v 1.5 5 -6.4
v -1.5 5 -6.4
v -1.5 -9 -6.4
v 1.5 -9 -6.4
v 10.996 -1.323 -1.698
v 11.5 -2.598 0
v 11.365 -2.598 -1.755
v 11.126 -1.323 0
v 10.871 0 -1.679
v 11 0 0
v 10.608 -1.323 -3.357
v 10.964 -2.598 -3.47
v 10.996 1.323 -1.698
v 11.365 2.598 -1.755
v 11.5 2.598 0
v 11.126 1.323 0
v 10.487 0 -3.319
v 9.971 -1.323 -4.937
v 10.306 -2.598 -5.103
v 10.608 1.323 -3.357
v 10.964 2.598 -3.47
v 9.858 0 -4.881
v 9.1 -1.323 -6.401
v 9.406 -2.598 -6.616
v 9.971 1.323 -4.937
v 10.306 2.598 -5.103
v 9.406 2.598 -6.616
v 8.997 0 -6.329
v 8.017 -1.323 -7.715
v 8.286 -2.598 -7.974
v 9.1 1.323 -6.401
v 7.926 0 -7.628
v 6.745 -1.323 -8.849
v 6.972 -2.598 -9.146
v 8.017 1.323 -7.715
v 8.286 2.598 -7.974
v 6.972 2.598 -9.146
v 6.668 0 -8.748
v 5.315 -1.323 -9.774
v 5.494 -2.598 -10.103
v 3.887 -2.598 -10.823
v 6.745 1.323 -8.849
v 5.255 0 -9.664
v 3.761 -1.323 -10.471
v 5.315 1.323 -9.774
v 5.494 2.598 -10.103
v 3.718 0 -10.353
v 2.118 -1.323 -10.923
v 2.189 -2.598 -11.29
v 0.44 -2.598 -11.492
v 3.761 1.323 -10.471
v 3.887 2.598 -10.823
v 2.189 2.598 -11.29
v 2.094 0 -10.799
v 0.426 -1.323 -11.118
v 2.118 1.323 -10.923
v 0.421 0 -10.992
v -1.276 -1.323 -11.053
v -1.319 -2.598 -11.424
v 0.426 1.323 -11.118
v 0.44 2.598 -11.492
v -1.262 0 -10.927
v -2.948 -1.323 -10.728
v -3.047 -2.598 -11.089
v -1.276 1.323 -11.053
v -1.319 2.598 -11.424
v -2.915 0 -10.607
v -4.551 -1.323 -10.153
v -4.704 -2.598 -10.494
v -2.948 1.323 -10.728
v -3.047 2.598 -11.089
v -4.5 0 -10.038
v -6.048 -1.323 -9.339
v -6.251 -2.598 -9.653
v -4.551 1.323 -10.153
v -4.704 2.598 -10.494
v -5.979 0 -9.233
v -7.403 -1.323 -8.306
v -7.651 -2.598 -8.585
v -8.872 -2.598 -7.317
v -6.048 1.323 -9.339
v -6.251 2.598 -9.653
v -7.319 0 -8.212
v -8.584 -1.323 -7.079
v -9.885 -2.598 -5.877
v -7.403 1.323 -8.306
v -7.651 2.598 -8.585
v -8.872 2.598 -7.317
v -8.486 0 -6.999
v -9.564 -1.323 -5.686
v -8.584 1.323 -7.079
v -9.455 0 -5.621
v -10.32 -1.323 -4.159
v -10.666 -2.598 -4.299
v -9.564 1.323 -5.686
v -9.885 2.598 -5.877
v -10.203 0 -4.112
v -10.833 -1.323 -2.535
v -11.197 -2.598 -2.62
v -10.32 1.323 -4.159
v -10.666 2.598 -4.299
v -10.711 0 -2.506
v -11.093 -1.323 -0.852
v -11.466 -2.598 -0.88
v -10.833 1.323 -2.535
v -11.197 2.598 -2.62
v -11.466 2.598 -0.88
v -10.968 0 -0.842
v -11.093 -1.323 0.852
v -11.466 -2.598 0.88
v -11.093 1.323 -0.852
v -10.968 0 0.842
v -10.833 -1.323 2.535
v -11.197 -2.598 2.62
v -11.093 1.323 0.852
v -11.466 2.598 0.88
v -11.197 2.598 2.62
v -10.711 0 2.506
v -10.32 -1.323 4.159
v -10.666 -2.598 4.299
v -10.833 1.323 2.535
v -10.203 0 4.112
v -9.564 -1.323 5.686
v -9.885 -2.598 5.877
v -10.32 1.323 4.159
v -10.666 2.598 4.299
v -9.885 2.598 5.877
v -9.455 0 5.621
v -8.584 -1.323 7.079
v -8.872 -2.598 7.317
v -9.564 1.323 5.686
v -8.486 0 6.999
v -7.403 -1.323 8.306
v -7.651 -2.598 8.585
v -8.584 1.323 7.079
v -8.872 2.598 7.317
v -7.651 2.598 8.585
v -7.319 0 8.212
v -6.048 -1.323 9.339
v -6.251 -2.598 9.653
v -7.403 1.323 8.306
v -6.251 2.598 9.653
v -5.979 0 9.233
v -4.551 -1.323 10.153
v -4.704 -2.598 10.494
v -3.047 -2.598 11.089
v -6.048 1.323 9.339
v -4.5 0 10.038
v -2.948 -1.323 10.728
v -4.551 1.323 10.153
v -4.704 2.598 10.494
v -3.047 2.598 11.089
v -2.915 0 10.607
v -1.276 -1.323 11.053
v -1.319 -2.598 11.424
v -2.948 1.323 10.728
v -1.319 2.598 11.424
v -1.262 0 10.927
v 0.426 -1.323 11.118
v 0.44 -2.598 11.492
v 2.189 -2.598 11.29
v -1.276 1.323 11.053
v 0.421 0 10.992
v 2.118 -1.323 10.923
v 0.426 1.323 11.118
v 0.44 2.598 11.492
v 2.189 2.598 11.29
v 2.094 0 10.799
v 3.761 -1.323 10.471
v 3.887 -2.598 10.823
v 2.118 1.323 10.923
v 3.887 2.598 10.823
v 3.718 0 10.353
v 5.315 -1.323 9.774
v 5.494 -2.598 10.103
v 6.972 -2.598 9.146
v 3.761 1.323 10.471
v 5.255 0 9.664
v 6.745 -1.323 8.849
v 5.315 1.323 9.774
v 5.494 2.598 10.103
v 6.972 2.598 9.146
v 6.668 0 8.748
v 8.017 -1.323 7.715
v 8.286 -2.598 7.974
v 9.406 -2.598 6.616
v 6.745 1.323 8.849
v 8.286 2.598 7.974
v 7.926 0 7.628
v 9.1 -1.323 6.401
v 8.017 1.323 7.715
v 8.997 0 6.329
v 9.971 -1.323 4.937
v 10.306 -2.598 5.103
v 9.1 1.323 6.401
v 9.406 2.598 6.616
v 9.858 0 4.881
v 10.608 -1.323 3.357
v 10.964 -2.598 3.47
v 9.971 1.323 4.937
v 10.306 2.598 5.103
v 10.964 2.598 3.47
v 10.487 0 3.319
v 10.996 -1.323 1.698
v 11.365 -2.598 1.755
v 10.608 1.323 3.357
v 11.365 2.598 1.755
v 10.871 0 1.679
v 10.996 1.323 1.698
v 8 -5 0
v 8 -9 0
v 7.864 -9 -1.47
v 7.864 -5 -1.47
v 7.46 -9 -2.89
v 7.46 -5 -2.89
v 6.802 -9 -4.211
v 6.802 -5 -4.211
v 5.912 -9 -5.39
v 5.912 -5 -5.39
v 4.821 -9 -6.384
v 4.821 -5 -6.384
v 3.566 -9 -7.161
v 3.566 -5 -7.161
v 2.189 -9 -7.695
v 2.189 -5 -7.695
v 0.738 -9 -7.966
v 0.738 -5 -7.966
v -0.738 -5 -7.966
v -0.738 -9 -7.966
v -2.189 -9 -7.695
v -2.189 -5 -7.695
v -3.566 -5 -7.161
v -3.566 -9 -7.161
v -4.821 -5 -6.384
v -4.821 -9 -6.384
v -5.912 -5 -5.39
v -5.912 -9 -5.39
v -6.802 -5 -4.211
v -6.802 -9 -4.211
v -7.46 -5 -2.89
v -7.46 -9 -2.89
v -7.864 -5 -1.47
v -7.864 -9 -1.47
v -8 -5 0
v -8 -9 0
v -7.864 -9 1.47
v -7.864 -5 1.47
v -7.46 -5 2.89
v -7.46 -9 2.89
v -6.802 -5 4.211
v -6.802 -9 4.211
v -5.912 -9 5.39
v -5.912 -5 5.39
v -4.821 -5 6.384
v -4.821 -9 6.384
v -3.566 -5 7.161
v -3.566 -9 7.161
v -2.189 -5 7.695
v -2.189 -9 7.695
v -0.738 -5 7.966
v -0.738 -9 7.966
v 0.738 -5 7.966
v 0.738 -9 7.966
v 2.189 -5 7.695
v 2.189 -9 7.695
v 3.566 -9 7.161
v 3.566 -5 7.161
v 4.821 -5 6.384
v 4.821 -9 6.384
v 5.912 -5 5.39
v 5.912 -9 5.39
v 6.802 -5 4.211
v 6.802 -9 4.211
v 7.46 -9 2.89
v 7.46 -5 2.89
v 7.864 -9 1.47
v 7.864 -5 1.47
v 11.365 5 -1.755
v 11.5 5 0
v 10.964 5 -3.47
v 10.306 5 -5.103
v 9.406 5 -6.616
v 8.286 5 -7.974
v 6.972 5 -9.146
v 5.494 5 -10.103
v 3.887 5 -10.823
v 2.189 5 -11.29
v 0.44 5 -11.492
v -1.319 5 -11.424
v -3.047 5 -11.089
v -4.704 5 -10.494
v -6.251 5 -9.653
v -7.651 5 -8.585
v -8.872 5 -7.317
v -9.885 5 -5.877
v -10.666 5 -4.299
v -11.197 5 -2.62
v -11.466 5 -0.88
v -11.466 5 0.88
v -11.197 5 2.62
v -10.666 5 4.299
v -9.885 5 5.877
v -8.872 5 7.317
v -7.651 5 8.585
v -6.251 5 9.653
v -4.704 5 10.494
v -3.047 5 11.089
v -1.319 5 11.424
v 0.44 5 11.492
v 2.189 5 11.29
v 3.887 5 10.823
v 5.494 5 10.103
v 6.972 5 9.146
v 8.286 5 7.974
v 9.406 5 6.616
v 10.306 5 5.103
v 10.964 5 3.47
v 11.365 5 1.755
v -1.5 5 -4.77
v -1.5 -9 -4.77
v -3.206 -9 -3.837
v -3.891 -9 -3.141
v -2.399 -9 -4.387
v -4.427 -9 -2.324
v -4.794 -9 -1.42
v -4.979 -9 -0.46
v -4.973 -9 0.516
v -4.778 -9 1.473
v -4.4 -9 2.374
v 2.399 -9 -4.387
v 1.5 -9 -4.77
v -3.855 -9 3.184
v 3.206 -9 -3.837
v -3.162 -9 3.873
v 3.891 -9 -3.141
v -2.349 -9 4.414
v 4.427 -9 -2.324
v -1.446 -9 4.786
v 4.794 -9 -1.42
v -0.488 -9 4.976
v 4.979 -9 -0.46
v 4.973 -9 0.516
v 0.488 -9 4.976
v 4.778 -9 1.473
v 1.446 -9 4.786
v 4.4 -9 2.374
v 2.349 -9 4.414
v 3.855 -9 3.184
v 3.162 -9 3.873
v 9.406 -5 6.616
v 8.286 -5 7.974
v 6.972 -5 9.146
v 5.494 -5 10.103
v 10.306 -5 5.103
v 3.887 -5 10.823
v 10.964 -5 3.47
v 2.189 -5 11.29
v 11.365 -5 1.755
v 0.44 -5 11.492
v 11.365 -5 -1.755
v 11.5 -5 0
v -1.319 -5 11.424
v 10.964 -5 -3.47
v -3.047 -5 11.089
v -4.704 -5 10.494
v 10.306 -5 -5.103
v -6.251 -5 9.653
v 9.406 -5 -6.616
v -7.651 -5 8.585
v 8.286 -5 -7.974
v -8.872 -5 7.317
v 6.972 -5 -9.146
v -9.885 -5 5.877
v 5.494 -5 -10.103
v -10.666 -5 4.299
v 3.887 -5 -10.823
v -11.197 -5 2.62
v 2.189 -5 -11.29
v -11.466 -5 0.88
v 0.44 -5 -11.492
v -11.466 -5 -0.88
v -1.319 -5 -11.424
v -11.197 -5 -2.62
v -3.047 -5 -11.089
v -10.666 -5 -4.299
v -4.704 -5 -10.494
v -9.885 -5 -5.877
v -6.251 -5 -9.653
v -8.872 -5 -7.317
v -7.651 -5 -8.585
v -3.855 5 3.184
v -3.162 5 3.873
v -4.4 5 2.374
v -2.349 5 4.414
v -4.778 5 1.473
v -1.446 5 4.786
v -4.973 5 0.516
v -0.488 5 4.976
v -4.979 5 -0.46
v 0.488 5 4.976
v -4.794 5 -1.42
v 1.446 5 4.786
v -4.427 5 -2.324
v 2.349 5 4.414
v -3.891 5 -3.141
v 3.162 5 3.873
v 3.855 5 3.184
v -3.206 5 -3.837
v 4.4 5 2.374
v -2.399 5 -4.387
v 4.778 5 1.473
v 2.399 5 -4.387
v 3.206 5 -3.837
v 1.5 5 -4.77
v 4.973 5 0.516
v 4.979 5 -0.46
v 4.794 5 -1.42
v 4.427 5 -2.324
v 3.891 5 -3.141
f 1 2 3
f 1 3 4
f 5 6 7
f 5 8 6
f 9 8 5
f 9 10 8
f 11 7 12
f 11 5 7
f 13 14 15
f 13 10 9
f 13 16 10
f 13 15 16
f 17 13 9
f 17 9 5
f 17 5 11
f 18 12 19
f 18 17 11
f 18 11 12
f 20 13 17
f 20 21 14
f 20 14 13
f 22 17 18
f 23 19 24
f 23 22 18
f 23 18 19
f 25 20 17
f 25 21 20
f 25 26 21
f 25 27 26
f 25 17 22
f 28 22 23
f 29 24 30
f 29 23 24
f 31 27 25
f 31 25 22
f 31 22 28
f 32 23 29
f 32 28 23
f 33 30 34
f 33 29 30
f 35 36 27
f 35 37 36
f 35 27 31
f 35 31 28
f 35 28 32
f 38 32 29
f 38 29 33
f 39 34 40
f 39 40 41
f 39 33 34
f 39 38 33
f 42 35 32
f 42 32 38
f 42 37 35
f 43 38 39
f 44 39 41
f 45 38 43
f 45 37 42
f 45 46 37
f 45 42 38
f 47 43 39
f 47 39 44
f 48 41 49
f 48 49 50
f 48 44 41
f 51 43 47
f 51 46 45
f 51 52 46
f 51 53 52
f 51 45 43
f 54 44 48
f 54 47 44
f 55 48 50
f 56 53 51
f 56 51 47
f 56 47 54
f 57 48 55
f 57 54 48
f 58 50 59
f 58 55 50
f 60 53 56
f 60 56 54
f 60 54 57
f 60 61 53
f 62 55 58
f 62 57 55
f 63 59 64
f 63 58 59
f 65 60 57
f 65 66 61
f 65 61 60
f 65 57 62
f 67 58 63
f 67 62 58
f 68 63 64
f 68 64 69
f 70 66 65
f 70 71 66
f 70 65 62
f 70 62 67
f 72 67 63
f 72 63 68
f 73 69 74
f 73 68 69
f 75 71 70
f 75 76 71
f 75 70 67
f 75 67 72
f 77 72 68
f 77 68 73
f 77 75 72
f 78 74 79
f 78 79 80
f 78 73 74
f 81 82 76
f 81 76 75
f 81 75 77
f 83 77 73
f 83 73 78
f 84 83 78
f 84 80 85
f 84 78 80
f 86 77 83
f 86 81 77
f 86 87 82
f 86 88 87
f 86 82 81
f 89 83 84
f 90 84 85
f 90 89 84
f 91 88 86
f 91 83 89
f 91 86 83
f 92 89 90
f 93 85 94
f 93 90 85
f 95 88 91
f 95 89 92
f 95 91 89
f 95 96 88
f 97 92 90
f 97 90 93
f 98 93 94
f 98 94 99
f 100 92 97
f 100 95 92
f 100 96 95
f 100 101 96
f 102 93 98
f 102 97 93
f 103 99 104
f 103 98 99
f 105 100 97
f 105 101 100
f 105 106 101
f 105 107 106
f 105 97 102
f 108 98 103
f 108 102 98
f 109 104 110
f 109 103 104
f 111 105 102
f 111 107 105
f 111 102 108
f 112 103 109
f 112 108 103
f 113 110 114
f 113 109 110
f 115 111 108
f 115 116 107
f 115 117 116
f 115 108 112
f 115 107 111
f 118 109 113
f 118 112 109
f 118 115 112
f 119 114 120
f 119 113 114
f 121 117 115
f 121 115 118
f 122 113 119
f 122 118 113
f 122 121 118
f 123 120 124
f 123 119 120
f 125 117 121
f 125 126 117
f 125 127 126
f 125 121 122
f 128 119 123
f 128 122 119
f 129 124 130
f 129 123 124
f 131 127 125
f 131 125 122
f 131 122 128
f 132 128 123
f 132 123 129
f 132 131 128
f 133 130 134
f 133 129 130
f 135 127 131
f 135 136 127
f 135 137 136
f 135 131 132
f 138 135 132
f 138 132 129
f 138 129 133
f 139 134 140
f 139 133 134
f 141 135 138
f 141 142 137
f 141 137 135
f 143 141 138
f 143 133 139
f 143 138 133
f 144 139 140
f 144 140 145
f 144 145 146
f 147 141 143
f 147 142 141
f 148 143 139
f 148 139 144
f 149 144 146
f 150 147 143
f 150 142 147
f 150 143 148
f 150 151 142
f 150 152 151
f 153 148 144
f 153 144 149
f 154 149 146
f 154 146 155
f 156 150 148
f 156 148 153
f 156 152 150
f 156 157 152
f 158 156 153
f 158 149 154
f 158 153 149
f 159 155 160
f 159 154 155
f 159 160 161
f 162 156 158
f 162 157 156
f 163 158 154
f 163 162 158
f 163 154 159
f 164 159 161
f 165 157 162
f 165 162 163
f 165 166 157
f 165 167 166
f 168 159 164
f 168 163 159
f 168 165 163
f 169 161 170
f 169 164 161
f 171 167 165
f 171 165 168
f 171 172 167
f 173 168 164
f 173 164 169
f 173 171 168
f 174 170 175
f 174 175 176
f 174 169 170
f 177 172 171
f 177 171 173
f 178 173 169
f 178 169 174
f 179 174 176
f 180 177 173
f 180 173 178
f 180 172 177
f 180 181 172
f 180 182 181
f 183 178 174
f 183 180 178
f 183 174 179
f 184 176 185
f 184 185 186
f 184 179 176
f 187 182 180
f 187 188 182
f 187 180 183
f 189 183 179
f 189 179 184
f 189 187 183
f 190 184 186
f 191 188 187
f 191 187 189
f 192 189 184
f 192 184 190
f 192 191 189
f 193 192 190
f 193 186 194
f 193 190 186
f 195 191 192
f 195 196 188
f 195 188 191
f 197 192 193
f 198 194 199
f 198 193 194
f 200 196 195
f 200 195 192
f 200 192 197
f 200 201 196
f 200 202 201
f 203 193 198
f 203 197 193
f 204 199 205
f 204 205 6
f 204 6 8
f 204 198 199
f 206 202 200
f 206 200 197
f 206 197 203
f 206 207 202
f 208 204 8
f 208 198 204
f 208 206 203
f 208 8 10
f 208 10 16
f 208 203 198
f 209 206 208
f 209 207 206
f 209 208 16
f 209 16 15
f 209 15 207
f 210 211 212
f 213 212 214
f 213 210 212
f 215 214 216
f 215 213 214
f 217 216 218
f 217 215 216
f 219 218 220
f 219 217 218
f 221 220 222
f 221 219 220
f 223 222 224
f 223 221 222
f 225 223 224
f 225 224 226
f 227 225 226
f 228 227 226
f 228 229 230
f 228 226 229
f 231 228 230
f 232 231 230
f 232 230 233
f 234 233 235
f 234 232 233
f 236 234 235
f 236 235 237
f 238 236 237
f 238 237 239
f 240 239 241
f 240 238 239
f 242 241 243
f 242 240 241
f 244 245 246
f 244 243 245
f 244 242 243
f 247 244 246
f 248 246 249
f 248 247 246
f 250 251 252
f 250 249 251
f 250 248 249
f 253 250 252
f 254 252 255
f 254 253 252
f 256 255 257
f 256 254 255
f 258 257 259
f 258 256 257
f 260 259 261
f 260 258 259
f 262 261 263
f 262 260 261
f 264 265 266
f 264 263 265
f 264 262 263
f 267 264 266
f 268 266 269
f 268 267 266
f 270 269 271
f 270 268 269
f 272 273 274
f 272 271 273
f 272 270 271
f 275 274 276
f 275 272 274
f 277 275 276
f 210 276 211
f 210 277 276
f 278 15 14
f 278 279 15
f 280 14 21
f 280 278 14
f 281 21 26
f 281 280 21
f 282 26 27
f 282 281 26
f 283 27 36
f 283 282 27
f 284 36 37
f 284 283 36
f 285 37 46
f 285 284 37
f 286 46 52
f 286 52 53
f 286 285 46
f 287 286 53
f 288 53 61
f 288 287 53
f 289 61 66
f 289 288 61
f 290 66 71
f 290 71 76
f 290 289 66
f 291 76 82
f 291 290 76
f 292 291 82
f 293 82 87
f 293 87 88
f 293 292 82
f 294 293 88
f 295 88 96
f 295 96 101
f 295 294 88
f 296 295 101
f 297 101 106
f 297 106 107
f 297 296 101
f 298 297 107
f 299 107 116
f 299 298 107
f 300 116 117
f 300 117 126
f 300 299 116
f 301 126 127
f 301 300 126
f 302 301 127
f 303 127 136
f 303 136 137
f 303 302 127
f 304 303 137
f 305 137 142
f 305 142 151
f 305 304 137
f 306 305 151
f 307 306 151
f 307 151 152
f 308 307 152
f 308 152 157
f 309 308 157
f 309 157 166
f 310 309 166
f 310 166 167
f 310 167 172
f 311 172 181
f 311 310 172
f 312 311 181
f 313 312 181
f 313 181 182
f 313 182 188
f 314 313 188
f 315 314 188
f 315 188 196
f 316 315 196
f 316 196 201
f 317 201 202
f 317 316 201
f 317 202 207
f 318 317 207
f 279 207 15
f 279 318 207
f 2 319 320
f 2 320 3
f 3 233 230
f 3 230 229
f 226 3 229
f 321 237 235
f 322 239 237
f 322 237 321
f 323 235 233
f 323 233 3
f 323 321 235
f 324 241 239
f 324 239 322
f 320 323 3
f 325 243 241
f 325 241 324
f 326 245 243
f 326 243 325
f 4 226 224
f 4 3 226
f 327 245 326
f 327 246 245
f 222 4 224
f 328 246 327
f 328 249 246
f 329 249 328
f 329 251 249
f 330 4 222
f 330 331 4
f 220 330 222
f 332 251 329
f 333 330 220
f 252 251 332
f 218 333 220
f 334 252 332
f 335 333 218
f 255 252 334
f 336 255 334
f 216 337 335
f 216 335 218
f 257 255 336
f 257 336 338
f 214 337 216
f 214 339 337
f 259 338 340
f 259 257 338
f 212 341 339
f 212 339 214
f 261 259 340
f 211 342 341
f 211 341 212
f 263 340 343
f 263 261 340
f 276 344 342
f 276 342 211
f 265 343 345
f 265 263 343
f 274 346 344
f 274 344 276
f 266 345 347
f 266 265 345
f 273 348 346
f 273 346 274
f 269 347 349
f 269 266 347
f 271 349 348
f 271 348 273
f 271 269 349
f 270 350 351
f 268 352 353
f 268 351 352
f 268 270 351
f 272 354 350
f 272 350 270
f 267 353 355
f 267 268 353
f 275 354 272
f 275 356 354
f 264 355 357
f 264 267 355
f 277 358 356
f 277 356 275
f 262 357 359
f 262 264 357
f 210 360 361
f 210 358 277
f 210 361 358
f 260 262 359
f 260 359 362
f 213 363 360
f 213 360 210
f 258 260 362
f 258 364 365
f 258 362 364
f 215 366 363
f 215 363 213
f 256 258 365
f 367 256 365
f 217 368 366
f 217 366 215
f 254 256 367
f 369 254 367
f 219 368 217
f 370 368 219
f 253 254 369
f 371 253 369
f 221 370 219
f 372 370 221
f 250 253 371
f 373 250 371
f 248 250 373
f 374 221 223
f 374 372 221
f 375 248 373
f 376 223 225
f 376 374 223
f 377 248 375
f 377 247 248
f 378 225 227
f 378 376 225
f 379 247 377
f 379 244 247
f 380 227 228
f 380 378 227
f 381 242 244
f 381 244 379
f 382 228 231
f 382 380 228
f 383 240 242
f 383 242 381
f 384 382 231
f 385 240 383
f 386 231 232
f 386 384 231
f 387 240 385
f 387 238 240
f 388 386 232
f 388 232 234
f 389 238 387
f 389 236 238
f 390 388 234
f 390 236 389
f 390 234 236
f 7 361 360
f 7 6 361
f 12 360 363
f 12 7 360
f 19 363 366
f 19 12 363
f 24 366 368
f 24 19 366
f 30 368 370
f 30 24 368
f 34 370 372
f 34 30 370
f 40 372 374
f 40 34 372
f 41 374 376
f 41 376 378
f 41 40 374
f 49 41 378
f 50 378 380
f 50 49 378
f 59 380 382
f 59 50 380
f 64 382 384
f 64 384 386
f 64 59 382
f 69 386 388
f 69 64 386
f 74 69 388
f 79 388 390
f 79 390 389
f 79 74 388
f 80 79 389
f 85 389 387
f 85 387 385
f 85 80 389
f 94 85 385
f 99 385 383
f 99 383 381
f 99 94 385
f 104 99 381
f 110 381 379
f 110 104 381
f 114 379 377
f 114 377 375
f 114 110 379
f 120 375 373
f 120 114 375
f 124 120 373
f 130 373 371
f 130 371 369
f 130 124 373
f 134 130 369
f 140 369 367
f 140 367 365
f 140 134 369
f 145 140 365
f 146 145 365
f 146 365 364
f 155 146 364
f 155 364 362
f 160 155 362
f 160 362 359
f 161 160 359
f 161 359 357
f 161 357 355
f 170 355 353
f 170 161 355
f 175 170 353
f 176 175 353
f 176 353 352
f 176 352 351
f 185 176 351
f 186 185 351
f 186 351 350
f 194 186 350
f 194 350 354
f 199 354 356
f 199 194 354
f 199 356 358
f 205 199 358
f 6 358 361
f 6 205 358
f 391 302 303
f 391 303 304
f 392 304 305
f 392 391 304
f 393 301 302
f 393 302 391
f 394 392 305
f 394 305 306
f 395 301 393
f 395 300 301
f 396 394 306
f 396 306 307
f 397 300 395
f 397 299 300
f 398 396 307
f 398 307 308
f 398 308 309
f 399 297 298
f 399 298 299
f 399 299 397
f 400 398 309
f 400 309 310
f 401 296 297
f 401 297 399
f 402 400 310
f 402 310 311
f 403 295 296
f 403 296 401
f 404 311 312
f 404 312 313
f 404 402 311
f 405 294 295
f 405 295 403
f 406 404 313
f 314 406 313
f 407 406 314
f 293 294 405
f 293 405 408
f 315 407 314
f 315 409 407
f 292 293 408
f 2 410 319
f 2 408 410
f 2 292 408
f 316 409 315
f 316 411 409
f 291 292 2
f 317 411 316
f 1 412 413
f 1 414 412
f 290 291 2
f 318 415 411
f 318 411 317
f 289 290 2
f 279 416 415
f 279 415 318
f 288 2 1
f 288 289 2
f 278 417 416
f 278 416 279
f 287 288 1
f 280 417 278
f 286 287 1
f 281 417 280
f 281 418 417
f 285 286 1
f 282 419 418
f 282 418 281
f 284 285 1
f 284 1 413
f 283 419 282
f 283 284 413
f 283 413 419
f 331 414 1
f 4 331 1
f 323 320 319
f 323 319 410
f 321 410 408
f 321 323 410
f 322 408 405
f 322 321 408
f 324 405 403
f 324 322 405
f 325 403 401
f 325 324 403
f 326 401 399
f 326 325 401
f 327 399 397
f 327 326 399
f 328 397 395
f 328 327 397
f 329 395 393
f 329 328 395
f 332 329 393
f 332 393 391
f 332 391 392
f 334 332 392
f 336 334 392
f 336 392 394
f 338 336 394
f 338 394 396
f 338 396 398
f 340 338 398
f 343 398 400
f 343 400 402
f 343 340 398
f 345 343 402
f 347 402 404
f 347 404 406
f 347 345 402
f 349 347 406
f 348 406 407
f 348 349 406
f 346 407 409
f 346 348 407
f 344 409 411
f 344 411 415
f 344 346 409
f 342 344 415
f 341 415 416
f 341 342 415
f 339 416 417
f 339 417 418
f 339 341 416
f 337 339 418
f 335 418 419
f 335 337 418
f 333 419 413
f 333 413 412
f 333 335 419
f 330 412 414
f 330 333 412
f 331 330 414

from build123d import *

# Parameters (mm, degrees)
ESQUISSE1_W             = 3
ESQUISSE1_H             = 2.8
ENL_V_MAT_EXTRU_1_DEPTH = 21
ESQUISSE2_R             = 8
ENL_V_MAT_EXTRU_2_DEPTH = 6


with BuildPart() as part:
    # Sketch1 → Revolve2 (revolve)
    with BuildSketch(Plane.XY):
        with BuildLine():
            Line((5, -15), (8, -15))
            Line((8, -15), (8, -5))
            Line((8, -5), (11.5, -5))
            Line((11.5, -5), (11.5, -2.598076211))
            ThreePointArc((11.5, -2.598076211), (11, 0), (11.5, 2.598076211))
            Line((11.5, 2.598076211), (11.5, 5))
            Line((11.5, 5), (5, 5))
            Line((5, 5), (5, -15))
        make_face()
    revolve(axis=Axis((0, -15, 0), (0, 1, 0)))

    # Esquisse1 → Enlèv. mat.-Extru.1 (cut, through all)
    with BuildSketch(Plane(origin=(0, 5, 0), x_dir=(1, 0, 0), z_dir=(0, 1, 0))):
        with Locations((0, 5)):
            Rectangle(ESQUISSE1_W, ESQUISSE1_H)
    extrude(amount=-ENL_V_MAT_EXTRU_1_DEPTH, mode=Mode.SUBTRACT)

    # Esquisse2 → Enlèv. mat.-Extru.2 (cut)
    with BuildSketch(Plane.XZ.offset(15)):
        Circle(ESQUISSE2_R)
    extrude(amount=-ENL_V_MAT_EXTRU_2_DEPTH, mode=Mode.SUBTRACT)


solid = part.part
